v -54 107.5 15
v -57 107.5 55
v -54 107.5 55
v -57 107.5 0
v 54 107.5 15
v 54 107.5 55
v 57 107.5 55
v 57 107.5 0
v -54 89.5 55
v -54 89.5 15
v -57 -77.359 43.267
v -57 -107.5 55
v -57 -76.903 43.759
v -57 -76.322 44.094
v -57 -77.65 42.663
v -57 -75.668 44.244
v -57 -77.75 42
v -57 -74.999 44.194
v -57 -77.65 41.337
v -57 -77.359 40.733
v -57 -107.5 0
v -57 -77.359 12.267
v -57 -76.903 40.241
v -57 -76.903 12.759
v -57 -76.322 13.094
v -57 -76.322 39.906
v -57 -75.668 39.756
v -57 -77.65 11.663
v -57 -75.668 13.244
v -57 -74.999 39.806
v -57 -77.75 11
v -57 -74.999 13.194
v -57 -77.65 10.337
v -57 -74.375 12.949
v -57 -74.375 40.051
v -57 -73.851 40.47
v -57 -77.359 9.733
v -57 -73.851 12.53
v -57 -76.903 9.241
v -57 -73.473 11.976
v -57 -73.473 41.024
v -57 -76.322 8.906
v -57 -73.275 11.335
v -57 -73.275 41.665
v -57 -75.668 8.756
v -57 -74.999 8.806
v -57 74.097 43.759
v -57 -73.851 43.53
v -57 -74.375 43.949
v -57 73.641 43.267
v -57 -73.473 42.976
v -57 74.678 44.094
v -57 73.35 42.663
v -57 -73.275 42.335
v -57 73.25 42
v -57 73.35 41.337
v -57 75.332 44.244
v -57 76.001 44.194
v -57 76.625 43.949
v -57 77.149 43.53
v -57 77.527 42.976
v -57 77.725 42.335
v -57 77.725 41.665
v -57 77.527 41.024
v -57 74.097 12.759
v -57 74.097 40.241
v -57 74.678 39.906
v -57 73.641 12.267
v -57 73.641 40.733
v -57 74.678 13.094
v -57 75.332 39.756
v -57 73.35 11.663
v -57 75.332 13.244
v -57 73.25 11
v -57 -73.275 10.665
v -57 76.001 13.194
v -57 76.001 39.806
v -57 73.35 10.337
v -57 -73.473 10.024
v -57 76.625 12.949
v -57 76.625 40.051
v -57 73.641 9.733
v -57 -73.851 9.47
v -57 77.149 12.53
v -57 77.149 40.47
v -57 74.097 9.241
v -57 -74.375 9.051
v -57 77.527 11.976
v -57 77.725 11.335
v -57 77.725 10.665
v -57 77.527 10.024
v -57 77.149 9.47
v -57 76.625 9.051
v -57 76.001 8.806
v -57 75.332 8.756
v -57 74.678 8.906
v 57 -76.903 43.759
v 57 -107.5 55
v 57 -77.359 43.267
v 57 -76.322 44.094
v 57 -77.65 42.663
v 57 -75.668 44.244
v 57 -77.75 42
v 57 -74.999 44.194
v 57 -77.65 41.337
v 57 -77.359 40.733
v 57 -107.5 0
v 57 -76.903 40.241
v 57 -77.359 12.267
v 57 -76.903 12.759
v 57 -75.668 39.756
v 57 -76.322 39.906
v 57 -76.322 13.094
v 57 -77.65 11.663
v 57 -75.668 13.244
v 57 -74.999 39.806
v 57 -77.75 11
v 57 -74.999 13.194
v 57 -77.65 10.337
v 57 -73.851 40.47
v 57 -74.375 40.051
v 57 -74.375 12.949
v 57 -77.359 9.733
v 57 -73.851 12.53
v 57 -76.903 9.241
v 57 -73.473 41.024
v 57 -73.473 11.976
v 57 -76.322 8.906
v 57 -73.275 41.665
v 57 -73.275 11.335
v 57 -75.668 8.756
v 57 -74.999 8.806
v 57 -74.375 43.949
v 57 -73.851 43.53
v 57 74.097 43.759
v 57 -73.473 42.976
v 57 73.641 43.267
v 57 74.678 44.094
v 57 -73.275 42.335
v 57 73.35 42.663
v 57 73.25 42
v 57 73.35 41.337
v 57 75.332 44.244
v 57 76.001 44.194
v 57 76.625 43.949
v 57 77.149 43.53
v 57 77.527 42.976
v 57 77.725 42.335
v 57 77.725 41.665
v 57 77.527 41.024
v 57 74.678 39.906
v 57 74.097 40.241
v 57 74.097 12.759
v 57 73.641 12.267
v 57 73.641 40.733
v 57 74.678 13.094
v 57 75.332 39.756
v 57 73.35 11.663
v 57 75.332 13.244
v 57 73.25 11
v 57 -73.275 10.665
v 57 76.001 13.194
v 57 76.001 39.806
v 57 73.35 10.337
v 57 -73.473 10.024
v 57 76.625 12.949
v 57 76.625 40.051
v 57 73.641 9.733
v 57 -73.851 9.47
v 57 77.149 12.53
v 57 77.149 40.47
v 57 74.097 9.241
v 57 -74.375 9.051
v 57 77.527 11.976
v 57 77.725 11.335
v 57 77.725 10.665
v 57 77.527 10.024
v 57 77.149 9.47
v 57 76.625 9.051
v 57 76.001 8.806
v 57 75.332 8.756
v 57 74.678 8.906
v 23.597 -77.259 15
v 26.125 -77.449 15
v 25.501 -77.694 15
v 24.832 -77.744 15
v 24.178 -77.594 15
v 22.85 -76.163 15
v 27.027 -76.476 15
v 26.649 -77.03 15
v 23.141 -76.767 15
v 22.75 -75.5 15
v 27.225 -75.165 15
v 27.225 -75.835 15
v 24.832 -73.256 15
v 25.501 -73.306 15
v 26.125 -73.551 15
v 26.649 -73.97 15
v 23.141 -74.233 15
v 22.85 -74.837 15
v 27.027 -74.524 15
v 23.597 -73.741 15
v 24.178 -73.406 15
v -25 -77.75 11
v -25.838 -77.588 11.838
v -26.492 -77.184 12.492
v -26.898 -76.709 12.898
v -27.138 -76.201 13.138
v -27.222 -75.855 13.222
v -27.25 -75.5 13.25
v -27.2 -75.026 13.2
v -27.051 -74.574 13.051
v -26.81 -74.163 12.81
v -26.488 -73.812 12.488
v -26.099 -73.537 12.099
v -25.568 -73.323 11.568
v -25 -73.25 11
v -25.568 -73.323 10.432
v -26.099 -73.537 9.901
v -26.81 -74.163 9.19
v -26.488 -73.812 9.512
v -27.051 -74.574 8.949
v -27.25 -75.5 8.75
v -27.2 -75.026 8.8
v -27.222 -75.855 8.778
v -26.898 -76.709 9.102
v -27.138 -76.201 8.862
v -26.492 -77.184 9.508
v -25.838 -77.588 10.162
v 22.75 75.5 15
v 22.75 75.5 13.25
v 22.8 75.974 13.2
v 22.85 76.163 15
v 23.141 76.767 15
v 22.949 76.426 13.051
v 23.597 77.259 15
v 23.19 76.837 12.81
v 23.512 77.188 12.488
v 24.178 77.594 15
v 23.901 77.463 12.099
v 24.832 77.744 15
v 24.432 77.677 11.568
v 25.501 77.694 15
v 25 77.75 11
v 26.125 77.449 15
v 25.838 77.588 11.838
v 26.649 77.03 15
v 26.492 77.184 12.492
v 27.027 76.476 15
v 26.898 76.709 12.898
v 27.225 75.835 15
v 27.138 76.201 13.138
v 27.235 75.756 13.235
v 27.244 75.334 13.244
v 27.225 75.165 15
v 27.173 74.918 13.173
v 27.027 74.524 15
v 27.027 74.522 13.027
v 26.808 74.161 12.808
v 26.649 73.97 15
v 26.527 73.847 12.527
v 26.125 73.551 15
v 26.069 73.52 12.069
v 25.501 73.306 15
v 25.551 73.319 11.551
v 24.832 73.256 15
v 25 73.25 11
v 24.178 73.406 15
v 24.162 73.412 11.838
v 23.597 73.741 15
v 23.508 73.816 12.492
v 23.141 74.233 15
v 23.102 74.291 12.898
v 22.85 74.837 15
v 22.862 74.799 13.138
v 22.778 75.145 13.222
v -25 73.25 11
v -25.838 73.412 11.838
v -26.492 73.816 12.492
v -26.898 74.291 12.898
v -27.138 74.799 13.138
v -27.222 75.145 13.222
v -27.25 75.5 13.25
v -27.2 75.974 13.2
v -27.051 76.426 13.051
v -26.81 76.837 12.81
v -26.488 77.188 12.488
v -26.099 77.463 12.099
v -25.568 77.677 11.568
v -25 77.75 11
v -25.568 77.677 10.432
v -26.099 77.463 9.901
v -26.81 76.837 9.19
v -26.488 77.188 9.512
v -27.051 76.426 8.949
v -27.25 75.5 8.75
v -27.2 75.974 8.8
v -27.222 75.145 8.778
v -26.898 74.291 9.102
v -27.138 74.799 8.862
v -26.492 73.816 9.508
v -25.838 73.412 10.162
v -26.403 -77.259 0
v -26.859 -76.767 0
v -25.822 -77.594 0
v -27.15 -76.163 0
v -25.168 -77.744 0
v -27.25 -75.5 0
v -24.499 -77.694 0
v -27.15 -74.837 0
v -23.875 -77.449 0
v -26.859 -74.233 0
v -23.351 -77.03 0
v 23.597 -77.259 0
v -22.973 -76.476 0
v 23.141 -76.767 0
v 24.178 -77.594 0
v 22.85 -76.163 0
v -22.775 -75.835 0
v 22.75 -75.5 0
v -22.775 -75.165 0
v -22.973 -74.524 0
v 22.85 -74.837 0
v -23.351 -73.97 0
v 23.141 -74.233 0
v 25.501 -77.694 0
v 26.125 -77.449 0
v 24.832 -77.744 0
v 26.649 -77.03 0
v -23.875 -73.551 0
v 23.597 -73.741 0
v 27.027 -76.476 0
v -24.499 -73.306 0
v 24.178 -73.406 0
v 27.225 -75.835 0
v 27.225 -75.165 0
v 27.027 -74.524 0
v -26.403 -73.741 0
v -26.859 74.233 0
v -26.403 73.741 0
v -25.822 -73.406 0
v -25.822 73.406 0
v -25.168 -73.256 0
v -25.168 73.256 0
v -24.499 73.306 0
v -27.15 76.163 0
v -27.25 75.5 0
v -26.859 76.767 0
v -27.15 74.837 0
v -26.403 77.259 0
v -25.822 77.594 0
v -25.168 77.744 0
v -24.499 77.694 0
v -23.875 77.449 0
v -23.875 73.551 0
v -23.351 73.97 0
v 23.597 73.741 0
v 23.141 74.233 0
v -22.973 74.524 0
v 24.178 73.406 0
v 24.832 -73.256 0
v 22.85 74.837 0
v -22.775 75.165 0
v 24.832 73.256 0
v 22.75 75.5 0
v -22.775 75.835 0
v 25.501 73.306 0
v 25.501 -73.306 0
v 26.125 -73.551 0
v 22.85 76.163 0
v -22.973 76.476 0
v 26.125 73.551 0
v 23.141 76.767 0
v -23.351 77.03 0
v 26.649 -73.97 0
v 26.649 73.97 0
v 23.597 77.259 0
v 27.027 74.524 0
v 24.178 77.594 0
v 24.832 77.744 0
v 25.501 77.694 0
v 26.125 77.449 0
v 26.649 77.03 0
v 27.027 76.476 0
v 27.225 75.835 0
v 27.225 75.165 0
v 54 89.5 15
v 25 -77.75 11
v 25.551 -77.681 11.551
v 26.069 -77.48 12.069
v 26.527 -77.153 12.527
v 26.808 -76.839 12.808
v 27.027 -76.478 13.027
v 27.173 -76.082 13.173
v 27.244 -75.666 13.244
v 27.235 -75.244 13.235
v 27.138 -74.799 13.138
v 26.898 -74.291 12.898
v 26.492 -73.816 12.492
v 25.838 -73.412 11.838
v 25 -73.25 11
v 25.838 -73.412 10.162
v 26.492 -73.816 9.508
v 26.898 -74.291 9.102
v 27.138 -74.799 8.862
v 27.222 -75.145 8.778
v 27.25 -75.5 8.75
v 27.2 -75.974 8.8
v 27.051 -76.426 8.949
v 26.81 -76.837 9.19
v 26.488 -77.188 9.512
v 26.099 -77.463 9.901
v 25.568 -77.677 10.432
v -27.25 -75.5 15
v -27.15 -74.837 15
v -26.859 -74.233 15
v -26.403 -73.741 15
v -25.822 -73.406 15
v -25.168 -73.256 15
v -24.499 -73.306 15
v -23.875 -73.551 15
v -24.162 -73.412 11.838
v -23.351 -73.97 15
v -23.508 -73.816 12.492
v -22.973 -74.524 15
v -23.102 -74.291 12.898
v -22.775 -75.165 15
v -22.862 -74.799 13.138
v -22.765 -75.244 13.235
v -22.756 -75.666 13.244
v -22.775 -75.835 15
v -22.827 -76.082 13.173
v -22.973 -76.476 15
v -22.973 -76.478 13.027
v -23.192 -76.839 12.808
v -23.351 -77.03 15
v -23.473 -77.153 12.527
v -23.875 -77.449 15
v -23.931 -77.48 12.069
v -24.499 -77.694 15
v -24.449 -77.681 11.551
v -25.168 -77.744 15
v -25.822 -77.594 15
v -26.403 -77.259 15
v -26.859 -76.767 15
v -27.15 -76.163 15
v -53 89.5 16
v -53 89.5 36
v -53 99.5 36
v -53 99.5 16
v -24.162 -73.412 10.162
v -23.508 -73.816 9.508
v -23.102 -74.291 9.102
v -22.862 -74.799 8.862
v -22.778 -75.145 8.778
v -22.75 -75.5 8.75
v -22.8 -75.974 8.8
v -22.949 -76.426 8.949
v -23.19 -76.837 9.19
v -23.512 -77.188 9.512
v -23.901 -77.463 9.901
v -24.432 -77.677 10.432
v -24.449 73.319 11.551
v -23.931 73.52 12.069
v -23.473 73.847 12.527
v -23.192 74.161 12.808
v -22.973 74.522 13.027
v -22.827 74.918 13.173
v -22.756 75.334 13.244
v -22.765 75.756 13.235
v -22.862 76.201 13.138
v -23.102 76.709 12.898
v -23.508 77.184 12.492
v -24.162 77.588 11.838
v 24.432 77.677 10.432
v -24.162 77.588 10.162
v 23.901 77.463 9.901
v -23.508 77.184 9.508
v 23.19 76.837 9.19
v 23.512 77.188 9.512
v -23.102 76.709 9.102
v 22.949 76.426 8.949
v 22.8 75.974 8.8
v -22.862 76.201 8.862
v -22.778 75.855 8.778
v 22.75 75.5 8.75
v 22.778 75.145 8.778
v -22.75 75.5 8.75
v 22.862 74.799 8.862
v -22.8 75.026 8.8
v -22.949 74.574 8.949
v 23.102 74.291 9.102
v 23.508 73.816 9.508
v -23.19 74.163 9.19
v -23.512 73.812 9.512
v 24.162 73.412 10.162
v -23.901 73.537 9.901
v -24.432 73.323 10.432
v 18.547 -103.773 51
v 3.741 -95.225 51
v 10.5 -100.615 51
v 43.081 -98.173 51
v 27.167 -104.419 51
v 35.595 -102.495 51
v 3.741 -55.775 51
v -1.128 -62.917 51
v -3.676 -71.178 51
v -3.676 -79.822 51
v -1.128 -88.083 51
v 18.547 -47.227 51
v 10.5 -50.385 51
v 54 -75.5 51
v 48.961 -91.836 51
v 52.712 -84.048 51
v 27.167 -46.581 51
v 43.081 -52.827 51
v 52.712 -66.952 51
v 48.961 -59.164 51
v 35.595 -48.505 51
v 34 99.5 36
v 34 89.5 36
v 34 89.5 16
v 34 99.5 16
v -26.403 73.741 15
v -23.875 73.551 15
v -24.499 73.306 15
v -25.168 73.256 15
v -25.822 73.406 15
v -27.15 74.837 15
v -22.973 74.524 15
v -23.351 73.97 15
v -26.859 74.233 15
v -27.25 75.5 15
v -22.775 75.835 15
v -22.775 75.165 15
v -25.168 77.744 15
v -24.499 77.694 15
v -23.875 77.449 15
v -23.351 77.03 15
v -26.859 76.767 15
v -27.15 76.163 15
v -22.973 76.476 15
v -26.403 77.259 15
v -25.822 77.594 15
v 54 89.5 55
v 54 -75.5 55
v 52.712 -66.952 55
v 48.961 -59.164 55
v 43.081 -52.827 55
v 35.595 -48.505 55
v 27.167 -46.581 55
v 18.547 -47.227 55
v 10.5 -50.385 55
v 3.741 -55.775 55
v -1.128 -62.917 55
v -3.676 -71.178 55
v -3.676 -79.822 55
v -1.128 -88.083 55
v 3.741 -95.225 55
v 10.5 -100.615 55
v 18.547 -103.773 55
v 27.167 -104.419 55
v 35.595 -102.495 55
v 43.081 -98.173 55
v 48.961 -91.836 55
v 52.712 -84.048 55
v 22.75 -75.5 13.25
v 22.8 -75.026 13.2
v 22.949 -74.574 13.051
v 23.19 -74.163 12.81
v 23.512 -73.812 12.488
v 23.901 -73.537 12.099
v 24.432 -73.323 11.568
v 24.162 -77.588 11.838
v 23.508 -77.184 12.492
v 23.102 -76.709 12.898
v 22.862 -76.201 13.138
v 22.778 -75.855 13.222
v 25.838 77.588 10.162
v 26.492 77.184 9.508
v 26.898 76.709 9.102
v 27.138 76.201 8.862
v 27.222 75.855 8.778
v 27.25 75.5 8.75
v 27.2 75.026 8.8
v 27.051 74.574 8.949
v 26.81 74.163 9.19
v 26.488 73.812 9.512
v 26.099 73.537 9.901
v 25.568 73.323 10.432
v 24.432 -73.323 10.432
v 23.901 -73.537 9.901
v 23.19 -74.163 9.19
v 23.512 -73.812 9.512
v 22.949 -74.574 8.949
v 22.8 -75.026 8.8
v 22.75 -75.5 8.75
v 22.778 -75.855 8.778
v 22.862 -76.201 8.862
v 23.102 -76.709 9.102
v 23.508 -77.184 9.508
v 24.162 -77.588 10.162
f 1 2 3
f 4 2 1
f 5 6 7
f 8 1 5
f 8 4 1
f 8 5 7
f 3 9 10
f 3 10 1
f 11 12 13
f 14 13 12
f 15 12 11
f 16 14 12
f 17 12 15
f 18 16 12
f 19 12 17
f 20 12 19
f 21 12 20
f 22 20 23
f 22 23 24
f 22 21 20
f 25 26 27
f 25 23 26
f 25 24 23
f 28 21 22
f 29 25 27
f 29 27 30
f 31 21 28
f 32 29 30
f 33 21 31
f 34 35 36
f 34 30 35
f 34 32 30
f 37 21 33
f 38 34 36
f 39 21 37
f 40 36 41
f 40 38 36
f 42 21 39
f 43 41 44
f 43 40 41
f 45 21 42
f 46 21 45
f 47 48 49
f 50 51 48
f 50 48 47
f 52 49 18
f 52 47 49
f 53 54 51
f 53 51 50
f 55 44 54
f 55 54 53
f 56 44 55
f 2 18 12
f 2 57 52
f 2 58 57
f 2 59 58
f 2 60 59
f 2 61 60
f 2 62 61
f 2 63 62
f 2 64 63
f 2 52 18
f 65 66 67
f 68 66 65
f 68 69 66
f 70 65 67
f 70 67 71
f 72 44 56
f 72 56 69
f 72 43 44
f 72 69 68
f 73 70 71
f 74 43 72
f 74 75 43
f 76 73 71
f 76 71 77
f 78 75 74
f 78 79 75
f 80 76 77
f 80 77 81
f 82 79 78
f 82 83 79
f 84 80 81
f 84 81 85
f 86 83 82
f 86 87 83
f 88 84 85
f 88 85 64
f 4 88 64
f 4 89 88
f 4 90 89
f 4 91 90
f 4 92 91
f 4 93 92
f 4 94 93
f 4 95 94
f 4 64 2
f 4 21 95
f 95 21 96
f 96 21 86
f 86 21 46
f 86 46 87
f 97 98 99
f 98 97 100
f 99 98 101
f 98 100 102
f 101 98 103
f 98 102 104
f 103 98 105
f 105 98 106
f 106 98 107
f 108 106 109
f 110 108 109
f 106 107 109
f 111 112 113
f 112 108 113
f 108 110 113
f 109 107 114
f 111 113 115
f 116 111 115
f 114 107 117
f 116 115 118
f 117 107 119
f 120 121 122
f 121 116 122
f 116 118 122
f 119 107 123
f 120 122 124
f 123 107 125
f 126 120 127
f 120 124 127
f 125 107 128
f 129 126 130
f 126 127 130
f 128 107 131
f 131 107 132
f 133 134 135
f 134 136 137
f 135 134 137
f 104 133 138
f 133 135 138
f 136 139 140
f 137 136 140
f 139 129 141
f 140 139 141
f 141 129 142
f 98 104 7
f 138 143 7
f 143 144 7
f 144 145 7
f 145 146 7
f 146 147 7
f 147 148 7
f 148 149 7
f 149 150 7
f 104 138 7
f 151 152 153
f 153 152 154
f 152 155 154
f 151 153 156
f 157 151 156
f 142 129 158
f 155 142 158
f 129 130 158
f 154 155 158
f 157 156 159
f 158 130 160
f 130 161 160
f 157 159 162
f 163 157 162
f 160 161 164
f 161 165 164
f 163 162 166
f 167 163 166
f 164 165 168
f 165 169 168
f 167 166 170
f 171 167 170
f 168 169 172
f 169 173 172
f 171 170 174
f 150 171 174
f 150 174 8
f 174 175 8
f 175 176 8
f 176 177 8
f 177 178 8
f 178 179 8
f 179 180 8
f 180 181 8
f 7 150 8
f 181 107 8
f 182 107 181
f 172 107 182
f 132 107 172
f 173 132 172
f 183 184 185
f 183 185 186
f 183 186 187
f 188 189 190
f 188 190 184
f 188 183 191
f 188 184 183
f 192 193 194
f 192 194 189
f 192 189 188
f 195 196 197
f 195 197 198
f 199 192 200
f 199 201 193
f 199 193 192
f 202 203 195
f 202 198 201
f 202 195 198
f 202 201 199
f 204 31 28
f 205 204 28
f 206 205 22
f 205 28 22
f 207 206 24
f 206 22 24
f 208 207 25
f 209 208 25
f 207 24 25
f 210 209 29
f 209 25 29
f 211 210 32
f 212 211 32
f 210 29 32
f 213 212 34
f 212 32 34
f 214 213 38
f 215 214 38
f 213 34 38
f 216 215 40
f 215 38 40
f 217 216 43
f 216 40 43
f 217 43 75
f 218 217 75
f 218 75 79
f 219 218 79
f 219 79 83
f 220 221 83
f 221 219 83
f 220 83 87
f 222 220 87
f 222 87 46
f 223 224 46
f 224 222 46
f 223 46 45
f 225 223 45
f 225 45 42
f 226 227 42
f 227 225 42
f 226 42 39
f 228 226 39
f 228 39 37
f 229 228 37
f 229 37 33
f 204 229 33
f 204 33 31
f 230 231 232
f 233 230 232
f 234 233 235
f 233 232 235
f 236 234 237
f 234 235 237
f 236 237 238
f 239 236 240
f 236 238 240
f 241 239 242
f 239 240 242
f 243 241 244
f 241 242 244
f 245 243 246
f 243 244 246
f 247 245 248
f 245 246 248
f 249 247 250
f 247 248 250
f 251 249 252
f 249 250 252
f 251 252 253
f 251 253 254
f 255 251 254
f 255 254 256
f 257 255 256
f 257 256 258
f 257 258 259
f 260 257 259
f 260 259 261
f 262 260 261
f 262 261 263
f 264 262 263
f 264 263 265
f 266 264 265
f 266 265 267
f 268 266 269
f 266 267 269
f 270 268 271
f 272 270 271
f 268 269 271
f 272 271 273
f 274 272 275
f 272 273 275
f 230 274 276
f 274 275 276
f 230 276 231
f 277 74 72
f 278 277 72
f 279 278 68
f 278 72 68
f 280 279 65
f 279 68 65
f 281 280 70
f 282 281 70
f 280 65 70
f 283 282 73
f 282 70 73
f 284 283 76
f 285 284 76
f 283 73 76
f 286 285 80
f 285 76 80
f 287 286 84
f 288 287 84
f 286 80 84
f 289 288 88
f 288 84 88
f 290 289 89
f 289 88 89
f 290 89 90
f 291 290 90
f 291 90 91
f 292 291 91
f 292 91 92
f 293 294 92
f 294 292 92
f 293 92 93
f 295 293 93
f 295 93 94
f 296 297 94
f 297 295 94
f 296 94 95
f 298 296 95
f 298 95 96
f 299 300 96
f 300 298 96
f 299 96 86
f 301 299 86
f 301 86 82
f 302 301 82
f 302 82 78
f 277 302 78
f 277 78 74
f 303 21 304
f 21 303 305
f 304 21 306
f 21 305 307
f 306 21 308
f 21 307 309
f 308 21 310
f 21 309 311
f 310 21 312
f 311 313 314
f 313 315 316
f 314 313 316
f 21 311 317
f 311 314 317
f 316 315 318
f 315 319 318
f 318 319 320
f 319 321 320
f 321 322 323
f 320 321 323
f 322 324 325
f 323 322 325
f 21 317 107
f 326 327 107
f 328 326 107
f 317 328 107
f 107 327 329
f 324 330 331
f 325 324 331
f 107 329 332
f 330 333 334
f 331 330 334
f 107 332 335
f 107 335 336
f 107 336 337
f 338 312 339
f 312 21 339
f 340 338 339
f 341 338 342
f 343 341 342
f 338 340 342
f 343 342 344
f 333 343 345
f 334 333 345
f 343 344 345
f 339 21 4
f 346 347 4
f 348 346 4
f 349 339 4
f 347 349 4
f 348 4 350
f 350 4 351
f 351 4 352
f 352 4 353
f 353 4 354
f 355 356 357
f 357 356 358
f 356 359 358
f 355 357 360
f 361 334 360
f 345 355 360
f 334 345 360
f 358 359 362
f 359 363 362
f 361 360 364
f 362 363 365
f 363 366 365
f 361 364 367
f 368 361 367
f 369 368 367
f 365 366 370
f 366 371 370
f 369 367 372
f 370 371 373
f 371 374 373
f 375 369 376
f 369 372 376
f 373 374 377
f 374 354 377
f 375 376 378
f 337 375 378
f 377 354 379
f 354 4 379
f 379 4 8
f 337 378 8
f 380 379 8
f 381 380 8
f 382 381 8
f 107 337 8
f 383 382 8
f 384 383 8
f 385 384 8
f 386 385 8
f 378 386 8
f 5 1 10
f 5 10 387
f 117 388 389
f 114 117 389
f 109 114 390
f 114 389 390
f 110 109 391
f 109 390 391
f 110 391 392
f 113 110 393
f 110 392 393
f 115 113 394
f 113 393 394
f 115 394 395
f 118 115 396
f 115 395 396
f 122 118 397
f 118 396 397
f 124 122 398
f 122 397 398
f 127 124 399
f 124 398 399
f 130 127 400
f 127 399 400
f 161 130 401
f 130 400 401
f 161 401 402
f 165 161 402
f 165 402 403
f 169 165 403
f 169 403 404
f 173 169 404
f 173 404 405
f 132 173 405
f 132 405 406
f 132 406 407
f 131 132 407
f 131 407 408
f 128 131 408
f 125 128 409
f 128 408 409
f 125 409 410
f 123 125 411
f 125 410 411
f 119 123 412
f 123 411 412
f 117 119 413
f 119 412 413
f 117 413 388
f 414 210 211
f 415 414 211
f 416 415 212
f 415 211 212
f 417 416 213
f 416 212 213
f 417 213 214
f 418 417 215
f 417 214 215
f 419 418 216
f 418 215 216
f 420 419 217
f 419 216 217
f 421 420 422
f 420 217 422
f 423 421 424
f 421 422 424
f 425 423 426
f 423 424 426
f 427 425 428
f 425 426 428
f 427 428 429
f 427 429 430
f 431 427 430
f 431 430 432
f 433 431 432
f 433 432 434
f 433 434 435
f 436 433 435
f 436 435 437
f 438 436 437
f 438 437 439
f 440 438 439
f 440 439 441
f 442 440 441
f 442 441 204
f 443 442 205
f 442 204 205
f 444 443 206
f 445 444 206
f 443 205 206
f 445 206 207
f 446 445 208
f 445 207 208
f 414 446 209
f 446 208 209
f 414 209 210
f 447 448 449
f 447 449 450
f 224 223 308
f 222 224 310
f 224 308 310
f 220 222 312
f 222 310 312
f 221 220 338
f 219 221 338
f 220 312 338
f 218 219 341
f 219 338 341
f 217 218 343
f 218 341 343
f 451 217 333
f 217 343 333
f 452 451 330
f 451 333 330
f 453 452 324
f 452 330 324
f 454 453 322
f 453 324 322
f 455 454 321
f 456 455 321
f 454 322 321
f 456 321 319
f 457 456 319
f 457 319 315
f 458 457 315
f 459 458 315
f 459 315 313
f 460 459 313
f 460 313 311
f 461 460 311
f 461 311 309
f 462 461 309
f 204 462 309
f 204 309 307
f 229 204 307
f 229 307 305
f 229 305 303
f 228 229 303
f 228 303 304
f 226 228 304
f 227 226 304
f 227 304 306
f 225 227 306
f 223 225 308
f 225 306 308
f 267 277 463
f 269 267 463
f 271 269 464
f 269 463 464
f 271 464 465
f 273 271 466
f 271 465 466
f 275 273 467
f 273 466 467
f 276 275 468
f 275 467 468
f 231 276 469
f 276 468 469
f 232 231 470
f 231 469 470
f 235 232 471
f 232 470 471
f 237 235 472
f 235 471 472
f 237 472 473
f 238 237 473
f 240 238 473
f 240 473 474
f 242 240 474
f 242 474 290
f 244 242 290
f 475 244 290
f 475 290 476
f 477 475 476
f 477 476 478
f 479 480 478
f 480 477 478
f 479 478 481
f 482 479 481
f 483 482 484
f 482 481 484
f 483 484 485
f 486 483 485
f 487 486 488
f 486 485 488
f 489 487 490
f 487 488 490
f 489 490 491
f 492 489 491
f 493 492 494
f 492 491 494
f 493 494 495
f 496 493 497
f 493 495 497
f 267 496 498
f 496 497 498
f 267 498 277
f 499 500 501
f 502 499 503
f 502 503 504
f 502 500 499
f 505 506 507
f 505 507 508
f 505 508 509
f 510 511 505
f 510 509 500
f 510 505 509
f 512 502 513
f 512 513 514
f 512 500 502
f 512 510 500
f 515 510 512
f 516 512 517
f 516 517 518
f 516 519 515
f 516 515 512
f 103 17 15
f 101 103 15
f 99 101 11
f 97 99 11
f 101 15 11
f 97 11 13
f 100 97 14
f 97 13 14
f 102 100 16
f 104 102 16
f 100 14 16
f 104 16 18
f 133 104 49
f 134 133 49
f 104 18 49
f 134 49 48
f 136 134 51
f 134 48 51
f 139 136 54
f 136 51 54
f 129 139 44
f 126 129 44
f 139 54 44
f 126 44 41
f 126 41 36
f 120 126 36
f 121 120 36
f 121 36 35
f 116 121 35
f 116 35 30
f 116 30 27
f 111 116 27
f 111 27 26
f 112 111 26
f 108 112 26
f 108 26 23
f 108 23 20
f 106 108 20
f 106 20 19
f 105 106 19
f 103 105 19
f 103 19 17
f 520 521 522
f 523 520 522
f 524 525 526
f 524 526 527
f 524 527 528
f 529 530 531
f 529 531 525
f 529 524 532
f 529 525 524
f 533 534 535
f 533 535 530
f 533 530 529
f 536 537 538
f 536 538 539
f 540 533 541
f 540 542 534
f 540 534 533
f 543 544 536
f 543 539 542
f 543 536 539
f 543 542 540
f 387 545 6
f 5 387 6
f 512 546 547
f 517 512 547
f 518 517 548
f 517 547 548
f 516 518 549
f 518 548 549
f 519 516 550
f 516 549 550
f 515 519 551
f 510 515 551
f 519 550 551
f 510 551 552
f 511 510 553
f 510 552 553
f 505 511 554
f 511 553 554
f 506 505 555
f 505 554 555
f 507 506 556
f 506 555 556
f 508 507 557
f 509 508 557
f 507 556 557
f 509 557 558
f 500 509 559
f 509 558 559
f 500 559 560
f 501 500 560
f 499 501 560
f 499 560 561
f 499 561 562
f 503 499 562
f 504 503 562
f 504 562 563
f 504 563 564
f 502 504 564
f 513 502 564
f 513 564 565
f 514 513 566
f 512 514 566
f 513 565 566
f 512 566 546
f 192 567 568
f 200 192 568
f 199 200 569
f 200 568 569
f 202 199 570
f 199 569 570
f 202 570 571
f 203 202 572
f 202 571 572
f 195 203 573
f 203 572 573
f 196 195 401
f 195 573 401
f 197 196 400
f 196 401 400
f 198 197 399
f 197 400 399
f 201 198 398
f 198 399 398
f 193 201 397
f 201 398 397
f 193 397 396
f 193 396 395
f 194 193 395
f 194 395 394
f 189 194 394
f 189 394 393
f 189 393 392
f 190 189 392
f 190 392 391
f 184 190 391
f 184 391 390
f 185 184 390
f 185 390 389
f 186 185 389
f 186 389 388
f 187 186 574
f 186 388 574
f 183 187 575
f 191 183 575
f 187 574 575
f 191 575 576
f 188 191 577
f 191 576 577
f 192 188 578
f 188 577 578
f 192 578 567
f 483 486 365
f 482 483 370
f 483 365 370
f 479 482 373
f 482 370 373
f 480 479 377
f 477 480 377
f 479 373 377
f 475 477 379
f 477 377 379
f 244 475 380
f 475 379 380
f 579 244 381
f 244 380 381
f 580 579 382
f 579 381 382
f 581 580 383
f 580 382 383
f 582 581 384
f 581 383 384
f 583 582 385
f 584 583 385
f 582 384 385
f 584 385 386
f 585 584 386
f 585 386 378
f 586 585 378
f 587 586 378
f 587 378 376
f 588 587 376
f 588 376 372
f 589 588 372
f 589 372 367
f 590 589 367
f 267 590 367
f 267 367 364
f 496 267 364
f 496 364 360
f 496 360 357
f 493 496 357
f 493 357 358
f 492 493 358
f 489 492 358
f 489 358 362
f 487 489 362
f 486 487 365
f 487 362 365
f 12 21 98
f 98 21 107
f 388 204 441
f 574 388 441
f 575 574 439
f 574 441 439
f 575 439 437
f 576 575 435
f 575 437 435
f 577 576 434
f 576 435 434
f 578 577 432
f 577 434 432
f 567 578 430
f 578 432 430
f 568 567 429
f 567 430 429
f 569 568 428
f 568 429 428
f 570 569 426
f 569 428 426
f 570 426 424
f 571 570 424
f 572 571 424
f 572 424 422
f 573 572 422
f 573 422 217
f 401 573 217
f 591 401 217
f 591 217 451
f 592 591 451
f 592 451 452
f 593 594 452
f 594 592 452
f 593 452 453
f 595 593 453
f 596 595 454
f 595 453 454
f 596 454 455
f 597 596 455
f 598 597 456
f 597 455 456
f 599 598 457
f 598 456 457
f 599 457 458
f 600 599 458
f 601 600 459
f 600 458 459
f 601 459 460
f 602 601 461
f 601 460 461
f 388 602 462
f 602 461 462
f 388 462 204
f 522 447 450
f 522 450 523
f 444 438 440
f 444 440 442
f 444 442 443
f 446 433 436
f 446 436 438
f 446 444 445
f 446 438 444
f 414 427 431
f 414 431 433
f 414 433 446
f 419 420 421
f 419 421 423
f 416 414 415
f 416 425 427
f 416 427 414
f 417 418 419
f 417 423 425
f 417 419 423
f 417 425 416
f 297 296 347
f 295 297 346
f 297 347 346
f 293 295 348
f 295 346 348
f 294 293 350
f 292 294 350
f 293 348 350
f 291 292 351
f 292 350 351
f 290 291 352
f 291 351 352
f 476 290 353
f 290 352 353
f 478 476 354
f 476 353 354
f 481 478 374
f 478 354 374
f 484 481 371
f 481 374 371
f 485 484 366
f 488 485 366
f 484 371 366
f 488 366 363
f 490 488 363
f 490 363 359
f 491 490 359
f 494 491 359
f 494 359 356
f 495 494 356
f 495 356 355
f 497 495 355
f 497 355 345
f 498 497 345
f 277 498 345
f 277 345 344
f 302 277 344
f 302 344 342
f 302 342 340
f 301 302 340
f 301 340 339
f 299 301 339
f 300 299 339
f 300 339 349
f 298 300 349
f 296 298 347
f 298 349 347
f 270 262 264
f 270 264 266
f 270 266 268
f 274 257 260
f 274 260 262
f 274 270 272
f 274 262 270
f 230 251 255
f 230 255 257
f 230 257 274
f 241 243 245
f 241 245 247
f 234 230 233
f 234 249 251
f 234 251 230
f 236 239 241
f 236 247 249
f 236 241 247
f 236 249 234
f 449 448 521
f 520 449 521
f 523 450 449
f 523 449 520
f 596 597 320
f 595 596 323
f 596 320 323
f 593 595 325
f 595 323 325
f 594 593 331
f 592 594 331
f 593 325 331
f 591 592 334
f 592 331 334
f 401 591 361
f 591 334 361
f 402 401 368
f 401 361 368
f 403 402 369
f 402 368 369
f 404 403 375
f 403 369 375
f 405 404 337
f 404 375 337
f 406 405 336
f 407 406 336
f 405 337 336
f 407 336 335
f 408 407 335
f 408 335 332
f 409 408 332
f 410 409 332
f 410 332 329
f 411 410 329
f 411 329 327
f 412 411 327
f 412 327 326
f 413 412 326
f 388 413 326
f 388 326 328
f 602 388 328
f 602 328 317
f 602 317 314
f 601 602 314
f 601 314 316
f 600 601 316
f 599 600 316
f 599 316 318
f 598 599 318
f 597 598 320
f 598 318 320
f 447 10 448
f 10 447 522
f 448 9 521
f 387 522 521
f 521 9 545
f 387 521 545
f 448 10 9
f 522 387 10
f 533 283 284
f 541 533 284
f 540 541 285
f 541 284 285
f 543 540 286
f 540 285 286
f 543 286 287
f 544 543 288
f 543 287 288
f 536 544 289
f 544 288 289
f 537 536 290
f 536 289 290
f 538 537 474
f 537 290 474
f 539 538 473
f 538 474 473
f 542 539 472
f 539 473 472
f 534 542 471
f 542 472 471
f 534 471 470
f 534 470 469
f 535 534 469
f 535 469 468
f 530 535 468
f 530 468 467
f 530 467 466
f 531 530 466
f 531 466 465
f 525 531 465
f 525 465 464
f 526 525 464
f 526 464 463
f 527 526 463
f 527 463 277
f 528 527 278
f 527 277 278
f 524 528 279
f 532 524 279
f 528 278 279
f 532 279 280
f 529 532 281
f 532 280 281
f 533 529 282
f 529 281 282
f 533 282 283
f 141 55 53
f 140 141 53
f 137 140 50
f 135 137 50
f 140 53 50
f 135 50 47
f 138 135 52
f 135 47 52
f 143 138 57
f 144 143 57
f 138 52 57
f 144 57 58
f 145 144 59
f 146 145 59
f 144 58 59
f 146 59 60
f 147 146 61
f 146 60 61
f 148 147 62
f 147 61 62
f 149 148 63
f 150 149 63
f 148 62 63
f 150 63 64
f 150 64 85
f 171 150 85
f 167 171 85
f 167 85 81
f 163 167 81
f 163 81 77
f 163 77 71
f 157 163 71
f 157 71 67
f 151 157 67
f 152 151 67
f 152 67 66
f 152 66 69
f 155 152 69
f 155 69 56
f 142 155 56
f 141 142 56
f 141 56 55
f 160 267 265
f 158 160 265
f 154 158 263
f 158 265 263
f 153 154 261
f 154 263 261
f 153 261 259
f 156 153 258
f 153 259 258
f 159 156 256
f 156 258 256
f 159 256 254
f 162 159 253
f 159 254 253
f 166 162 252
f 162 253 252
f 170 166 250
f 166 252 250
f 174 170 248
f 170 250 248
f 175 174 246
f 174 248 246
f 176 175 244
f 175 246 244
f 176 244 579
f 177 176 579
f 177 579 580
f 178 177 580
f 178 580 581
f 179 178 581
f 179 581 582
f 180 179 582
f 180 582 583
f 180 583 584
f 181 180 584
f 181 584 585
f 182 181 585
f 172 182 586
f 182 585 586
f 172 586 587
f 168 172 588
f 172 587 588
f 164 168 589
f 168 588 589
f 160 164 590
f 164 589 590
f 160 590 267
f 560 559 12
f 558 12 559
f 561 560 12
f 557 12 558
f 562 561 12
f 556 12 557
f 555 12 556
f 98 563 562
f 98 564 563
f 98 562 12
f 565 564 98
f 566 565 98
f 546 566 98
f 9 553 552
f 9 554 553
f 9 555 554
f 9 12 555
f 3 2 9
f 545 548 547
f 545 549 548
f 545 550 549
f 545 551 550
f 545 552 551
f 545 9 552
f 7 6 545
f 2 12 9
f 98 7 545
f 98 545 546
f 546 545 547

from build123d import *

# Parameters (mm, degrees)
SKETCH1_W           = 114
SKETCH1_H           = 215
BOSS_EXTRUDE1_DEPTH = 55
SKETCH2_W           = 108
SKETCH2_H           = 18
CUT_EXTRUDE1_DEPTH  = 40
SKETCH3_W           = 87
SKETCH3_H           = 20
BOSS_EXTRUDE2_DEPTH = 10
SKETCH4_R           = 29
CUT_EXTRUDE3_DEPTH  = 4
SKETCH5_R           = 2.25
CUT_EXTRUDE4_DEPTH  = 15
SKETCH6_R           = 2.25
CUT_EXTRUDE5_DEPTH  = 167.063993689


with BuildPart() as part:
    # Sketch1 → Boss-Extrude1 (new body)
    with BuildSketch(Plane.XY):
        Rectangle(SKETCH1_W, SKETCH1_H)
    extrude(amount=BOSS_EXTRUDE1_DEPTH)

    # Sketch2 → Cut-Extrude1 (cut)
    with BuildSketch(Plane.XY.offset(55)):
        with Locations((0, 98.5)):
            Rectangle(SKETCH2_W, SKETCH2_H)
    extrude(amount=-CUT_EXTRUDE1_DEPTH, mode=Mode.SUBTRACT)

    # Sketch3 → Boss-Extrude2 (add)
    with BuildSketch(Plane(origin=(0, 89.5, 0), x_dir=(1, 0, 0), z_dir=(0, 1, 0))):
        with Locations((-9.5, -26)):
            Rectangle(SKETCH3_W, SKETCH3_H)
    extrude(amount=BOSS_EXTRUDE2_DEPTH)

    # Sketch4 → Cut-Extrude3 (cut)
    with BuildSketch(Plane.XY.offset(55)):
        with Locations((25, -75.5)):
            Circle(SKETCH4_R)
    extrude(amount=-CUT_EXTRUDE3_DEPTH, mode=Mode.SUBTRACT)

    # Sketch5 → Cut-Extrude4 (cut)
    with BuildSketch(Plane(origin=(0, 0, 0), x_dir=(-1, 0, 0), z_dir=(0, 0, -1))):
        with Locations((-25, 75.5)):
            Circle(SKETCH5_R)
        with Locations((25, 75.5)):
            Circle(SKETCH5_R)
        with Locations((25, -75.5)):
            Circle(SKETCH5_R)
        with Locations((-25, -75.5)):
            Circle(SKETCH5_R)
    extrude(amount=-CUT_EXTRUDE4_DEPTH, mode=Mode.SUBTRACT)

    # Sketch6 → Cut-Extrude5 (cut, through all)
    with BuildSketch(Plane.ZY.offset(57)):
        with Locations(Location((11, 75.5, 0), (0, 0, 270))):
            Circle(SKETCH6_R)
        with Locations(Location((42, 75.5, 0), (0, 0, 270))):
            Circle(SKETCH6_R)
        with Locations(Location((42, -75.5, 0), (0, 0, 270))):
            Circle(SKETCH6_R)
        with Locations(Location((11, -75.5, 0), (0, 0, 270))):
            Circle(SKETCH6_R)
    extrude(amount=-CUT_EXTRUDE5_DEPTH, mode=Mode.SUBTRACT)


solid = part.part
